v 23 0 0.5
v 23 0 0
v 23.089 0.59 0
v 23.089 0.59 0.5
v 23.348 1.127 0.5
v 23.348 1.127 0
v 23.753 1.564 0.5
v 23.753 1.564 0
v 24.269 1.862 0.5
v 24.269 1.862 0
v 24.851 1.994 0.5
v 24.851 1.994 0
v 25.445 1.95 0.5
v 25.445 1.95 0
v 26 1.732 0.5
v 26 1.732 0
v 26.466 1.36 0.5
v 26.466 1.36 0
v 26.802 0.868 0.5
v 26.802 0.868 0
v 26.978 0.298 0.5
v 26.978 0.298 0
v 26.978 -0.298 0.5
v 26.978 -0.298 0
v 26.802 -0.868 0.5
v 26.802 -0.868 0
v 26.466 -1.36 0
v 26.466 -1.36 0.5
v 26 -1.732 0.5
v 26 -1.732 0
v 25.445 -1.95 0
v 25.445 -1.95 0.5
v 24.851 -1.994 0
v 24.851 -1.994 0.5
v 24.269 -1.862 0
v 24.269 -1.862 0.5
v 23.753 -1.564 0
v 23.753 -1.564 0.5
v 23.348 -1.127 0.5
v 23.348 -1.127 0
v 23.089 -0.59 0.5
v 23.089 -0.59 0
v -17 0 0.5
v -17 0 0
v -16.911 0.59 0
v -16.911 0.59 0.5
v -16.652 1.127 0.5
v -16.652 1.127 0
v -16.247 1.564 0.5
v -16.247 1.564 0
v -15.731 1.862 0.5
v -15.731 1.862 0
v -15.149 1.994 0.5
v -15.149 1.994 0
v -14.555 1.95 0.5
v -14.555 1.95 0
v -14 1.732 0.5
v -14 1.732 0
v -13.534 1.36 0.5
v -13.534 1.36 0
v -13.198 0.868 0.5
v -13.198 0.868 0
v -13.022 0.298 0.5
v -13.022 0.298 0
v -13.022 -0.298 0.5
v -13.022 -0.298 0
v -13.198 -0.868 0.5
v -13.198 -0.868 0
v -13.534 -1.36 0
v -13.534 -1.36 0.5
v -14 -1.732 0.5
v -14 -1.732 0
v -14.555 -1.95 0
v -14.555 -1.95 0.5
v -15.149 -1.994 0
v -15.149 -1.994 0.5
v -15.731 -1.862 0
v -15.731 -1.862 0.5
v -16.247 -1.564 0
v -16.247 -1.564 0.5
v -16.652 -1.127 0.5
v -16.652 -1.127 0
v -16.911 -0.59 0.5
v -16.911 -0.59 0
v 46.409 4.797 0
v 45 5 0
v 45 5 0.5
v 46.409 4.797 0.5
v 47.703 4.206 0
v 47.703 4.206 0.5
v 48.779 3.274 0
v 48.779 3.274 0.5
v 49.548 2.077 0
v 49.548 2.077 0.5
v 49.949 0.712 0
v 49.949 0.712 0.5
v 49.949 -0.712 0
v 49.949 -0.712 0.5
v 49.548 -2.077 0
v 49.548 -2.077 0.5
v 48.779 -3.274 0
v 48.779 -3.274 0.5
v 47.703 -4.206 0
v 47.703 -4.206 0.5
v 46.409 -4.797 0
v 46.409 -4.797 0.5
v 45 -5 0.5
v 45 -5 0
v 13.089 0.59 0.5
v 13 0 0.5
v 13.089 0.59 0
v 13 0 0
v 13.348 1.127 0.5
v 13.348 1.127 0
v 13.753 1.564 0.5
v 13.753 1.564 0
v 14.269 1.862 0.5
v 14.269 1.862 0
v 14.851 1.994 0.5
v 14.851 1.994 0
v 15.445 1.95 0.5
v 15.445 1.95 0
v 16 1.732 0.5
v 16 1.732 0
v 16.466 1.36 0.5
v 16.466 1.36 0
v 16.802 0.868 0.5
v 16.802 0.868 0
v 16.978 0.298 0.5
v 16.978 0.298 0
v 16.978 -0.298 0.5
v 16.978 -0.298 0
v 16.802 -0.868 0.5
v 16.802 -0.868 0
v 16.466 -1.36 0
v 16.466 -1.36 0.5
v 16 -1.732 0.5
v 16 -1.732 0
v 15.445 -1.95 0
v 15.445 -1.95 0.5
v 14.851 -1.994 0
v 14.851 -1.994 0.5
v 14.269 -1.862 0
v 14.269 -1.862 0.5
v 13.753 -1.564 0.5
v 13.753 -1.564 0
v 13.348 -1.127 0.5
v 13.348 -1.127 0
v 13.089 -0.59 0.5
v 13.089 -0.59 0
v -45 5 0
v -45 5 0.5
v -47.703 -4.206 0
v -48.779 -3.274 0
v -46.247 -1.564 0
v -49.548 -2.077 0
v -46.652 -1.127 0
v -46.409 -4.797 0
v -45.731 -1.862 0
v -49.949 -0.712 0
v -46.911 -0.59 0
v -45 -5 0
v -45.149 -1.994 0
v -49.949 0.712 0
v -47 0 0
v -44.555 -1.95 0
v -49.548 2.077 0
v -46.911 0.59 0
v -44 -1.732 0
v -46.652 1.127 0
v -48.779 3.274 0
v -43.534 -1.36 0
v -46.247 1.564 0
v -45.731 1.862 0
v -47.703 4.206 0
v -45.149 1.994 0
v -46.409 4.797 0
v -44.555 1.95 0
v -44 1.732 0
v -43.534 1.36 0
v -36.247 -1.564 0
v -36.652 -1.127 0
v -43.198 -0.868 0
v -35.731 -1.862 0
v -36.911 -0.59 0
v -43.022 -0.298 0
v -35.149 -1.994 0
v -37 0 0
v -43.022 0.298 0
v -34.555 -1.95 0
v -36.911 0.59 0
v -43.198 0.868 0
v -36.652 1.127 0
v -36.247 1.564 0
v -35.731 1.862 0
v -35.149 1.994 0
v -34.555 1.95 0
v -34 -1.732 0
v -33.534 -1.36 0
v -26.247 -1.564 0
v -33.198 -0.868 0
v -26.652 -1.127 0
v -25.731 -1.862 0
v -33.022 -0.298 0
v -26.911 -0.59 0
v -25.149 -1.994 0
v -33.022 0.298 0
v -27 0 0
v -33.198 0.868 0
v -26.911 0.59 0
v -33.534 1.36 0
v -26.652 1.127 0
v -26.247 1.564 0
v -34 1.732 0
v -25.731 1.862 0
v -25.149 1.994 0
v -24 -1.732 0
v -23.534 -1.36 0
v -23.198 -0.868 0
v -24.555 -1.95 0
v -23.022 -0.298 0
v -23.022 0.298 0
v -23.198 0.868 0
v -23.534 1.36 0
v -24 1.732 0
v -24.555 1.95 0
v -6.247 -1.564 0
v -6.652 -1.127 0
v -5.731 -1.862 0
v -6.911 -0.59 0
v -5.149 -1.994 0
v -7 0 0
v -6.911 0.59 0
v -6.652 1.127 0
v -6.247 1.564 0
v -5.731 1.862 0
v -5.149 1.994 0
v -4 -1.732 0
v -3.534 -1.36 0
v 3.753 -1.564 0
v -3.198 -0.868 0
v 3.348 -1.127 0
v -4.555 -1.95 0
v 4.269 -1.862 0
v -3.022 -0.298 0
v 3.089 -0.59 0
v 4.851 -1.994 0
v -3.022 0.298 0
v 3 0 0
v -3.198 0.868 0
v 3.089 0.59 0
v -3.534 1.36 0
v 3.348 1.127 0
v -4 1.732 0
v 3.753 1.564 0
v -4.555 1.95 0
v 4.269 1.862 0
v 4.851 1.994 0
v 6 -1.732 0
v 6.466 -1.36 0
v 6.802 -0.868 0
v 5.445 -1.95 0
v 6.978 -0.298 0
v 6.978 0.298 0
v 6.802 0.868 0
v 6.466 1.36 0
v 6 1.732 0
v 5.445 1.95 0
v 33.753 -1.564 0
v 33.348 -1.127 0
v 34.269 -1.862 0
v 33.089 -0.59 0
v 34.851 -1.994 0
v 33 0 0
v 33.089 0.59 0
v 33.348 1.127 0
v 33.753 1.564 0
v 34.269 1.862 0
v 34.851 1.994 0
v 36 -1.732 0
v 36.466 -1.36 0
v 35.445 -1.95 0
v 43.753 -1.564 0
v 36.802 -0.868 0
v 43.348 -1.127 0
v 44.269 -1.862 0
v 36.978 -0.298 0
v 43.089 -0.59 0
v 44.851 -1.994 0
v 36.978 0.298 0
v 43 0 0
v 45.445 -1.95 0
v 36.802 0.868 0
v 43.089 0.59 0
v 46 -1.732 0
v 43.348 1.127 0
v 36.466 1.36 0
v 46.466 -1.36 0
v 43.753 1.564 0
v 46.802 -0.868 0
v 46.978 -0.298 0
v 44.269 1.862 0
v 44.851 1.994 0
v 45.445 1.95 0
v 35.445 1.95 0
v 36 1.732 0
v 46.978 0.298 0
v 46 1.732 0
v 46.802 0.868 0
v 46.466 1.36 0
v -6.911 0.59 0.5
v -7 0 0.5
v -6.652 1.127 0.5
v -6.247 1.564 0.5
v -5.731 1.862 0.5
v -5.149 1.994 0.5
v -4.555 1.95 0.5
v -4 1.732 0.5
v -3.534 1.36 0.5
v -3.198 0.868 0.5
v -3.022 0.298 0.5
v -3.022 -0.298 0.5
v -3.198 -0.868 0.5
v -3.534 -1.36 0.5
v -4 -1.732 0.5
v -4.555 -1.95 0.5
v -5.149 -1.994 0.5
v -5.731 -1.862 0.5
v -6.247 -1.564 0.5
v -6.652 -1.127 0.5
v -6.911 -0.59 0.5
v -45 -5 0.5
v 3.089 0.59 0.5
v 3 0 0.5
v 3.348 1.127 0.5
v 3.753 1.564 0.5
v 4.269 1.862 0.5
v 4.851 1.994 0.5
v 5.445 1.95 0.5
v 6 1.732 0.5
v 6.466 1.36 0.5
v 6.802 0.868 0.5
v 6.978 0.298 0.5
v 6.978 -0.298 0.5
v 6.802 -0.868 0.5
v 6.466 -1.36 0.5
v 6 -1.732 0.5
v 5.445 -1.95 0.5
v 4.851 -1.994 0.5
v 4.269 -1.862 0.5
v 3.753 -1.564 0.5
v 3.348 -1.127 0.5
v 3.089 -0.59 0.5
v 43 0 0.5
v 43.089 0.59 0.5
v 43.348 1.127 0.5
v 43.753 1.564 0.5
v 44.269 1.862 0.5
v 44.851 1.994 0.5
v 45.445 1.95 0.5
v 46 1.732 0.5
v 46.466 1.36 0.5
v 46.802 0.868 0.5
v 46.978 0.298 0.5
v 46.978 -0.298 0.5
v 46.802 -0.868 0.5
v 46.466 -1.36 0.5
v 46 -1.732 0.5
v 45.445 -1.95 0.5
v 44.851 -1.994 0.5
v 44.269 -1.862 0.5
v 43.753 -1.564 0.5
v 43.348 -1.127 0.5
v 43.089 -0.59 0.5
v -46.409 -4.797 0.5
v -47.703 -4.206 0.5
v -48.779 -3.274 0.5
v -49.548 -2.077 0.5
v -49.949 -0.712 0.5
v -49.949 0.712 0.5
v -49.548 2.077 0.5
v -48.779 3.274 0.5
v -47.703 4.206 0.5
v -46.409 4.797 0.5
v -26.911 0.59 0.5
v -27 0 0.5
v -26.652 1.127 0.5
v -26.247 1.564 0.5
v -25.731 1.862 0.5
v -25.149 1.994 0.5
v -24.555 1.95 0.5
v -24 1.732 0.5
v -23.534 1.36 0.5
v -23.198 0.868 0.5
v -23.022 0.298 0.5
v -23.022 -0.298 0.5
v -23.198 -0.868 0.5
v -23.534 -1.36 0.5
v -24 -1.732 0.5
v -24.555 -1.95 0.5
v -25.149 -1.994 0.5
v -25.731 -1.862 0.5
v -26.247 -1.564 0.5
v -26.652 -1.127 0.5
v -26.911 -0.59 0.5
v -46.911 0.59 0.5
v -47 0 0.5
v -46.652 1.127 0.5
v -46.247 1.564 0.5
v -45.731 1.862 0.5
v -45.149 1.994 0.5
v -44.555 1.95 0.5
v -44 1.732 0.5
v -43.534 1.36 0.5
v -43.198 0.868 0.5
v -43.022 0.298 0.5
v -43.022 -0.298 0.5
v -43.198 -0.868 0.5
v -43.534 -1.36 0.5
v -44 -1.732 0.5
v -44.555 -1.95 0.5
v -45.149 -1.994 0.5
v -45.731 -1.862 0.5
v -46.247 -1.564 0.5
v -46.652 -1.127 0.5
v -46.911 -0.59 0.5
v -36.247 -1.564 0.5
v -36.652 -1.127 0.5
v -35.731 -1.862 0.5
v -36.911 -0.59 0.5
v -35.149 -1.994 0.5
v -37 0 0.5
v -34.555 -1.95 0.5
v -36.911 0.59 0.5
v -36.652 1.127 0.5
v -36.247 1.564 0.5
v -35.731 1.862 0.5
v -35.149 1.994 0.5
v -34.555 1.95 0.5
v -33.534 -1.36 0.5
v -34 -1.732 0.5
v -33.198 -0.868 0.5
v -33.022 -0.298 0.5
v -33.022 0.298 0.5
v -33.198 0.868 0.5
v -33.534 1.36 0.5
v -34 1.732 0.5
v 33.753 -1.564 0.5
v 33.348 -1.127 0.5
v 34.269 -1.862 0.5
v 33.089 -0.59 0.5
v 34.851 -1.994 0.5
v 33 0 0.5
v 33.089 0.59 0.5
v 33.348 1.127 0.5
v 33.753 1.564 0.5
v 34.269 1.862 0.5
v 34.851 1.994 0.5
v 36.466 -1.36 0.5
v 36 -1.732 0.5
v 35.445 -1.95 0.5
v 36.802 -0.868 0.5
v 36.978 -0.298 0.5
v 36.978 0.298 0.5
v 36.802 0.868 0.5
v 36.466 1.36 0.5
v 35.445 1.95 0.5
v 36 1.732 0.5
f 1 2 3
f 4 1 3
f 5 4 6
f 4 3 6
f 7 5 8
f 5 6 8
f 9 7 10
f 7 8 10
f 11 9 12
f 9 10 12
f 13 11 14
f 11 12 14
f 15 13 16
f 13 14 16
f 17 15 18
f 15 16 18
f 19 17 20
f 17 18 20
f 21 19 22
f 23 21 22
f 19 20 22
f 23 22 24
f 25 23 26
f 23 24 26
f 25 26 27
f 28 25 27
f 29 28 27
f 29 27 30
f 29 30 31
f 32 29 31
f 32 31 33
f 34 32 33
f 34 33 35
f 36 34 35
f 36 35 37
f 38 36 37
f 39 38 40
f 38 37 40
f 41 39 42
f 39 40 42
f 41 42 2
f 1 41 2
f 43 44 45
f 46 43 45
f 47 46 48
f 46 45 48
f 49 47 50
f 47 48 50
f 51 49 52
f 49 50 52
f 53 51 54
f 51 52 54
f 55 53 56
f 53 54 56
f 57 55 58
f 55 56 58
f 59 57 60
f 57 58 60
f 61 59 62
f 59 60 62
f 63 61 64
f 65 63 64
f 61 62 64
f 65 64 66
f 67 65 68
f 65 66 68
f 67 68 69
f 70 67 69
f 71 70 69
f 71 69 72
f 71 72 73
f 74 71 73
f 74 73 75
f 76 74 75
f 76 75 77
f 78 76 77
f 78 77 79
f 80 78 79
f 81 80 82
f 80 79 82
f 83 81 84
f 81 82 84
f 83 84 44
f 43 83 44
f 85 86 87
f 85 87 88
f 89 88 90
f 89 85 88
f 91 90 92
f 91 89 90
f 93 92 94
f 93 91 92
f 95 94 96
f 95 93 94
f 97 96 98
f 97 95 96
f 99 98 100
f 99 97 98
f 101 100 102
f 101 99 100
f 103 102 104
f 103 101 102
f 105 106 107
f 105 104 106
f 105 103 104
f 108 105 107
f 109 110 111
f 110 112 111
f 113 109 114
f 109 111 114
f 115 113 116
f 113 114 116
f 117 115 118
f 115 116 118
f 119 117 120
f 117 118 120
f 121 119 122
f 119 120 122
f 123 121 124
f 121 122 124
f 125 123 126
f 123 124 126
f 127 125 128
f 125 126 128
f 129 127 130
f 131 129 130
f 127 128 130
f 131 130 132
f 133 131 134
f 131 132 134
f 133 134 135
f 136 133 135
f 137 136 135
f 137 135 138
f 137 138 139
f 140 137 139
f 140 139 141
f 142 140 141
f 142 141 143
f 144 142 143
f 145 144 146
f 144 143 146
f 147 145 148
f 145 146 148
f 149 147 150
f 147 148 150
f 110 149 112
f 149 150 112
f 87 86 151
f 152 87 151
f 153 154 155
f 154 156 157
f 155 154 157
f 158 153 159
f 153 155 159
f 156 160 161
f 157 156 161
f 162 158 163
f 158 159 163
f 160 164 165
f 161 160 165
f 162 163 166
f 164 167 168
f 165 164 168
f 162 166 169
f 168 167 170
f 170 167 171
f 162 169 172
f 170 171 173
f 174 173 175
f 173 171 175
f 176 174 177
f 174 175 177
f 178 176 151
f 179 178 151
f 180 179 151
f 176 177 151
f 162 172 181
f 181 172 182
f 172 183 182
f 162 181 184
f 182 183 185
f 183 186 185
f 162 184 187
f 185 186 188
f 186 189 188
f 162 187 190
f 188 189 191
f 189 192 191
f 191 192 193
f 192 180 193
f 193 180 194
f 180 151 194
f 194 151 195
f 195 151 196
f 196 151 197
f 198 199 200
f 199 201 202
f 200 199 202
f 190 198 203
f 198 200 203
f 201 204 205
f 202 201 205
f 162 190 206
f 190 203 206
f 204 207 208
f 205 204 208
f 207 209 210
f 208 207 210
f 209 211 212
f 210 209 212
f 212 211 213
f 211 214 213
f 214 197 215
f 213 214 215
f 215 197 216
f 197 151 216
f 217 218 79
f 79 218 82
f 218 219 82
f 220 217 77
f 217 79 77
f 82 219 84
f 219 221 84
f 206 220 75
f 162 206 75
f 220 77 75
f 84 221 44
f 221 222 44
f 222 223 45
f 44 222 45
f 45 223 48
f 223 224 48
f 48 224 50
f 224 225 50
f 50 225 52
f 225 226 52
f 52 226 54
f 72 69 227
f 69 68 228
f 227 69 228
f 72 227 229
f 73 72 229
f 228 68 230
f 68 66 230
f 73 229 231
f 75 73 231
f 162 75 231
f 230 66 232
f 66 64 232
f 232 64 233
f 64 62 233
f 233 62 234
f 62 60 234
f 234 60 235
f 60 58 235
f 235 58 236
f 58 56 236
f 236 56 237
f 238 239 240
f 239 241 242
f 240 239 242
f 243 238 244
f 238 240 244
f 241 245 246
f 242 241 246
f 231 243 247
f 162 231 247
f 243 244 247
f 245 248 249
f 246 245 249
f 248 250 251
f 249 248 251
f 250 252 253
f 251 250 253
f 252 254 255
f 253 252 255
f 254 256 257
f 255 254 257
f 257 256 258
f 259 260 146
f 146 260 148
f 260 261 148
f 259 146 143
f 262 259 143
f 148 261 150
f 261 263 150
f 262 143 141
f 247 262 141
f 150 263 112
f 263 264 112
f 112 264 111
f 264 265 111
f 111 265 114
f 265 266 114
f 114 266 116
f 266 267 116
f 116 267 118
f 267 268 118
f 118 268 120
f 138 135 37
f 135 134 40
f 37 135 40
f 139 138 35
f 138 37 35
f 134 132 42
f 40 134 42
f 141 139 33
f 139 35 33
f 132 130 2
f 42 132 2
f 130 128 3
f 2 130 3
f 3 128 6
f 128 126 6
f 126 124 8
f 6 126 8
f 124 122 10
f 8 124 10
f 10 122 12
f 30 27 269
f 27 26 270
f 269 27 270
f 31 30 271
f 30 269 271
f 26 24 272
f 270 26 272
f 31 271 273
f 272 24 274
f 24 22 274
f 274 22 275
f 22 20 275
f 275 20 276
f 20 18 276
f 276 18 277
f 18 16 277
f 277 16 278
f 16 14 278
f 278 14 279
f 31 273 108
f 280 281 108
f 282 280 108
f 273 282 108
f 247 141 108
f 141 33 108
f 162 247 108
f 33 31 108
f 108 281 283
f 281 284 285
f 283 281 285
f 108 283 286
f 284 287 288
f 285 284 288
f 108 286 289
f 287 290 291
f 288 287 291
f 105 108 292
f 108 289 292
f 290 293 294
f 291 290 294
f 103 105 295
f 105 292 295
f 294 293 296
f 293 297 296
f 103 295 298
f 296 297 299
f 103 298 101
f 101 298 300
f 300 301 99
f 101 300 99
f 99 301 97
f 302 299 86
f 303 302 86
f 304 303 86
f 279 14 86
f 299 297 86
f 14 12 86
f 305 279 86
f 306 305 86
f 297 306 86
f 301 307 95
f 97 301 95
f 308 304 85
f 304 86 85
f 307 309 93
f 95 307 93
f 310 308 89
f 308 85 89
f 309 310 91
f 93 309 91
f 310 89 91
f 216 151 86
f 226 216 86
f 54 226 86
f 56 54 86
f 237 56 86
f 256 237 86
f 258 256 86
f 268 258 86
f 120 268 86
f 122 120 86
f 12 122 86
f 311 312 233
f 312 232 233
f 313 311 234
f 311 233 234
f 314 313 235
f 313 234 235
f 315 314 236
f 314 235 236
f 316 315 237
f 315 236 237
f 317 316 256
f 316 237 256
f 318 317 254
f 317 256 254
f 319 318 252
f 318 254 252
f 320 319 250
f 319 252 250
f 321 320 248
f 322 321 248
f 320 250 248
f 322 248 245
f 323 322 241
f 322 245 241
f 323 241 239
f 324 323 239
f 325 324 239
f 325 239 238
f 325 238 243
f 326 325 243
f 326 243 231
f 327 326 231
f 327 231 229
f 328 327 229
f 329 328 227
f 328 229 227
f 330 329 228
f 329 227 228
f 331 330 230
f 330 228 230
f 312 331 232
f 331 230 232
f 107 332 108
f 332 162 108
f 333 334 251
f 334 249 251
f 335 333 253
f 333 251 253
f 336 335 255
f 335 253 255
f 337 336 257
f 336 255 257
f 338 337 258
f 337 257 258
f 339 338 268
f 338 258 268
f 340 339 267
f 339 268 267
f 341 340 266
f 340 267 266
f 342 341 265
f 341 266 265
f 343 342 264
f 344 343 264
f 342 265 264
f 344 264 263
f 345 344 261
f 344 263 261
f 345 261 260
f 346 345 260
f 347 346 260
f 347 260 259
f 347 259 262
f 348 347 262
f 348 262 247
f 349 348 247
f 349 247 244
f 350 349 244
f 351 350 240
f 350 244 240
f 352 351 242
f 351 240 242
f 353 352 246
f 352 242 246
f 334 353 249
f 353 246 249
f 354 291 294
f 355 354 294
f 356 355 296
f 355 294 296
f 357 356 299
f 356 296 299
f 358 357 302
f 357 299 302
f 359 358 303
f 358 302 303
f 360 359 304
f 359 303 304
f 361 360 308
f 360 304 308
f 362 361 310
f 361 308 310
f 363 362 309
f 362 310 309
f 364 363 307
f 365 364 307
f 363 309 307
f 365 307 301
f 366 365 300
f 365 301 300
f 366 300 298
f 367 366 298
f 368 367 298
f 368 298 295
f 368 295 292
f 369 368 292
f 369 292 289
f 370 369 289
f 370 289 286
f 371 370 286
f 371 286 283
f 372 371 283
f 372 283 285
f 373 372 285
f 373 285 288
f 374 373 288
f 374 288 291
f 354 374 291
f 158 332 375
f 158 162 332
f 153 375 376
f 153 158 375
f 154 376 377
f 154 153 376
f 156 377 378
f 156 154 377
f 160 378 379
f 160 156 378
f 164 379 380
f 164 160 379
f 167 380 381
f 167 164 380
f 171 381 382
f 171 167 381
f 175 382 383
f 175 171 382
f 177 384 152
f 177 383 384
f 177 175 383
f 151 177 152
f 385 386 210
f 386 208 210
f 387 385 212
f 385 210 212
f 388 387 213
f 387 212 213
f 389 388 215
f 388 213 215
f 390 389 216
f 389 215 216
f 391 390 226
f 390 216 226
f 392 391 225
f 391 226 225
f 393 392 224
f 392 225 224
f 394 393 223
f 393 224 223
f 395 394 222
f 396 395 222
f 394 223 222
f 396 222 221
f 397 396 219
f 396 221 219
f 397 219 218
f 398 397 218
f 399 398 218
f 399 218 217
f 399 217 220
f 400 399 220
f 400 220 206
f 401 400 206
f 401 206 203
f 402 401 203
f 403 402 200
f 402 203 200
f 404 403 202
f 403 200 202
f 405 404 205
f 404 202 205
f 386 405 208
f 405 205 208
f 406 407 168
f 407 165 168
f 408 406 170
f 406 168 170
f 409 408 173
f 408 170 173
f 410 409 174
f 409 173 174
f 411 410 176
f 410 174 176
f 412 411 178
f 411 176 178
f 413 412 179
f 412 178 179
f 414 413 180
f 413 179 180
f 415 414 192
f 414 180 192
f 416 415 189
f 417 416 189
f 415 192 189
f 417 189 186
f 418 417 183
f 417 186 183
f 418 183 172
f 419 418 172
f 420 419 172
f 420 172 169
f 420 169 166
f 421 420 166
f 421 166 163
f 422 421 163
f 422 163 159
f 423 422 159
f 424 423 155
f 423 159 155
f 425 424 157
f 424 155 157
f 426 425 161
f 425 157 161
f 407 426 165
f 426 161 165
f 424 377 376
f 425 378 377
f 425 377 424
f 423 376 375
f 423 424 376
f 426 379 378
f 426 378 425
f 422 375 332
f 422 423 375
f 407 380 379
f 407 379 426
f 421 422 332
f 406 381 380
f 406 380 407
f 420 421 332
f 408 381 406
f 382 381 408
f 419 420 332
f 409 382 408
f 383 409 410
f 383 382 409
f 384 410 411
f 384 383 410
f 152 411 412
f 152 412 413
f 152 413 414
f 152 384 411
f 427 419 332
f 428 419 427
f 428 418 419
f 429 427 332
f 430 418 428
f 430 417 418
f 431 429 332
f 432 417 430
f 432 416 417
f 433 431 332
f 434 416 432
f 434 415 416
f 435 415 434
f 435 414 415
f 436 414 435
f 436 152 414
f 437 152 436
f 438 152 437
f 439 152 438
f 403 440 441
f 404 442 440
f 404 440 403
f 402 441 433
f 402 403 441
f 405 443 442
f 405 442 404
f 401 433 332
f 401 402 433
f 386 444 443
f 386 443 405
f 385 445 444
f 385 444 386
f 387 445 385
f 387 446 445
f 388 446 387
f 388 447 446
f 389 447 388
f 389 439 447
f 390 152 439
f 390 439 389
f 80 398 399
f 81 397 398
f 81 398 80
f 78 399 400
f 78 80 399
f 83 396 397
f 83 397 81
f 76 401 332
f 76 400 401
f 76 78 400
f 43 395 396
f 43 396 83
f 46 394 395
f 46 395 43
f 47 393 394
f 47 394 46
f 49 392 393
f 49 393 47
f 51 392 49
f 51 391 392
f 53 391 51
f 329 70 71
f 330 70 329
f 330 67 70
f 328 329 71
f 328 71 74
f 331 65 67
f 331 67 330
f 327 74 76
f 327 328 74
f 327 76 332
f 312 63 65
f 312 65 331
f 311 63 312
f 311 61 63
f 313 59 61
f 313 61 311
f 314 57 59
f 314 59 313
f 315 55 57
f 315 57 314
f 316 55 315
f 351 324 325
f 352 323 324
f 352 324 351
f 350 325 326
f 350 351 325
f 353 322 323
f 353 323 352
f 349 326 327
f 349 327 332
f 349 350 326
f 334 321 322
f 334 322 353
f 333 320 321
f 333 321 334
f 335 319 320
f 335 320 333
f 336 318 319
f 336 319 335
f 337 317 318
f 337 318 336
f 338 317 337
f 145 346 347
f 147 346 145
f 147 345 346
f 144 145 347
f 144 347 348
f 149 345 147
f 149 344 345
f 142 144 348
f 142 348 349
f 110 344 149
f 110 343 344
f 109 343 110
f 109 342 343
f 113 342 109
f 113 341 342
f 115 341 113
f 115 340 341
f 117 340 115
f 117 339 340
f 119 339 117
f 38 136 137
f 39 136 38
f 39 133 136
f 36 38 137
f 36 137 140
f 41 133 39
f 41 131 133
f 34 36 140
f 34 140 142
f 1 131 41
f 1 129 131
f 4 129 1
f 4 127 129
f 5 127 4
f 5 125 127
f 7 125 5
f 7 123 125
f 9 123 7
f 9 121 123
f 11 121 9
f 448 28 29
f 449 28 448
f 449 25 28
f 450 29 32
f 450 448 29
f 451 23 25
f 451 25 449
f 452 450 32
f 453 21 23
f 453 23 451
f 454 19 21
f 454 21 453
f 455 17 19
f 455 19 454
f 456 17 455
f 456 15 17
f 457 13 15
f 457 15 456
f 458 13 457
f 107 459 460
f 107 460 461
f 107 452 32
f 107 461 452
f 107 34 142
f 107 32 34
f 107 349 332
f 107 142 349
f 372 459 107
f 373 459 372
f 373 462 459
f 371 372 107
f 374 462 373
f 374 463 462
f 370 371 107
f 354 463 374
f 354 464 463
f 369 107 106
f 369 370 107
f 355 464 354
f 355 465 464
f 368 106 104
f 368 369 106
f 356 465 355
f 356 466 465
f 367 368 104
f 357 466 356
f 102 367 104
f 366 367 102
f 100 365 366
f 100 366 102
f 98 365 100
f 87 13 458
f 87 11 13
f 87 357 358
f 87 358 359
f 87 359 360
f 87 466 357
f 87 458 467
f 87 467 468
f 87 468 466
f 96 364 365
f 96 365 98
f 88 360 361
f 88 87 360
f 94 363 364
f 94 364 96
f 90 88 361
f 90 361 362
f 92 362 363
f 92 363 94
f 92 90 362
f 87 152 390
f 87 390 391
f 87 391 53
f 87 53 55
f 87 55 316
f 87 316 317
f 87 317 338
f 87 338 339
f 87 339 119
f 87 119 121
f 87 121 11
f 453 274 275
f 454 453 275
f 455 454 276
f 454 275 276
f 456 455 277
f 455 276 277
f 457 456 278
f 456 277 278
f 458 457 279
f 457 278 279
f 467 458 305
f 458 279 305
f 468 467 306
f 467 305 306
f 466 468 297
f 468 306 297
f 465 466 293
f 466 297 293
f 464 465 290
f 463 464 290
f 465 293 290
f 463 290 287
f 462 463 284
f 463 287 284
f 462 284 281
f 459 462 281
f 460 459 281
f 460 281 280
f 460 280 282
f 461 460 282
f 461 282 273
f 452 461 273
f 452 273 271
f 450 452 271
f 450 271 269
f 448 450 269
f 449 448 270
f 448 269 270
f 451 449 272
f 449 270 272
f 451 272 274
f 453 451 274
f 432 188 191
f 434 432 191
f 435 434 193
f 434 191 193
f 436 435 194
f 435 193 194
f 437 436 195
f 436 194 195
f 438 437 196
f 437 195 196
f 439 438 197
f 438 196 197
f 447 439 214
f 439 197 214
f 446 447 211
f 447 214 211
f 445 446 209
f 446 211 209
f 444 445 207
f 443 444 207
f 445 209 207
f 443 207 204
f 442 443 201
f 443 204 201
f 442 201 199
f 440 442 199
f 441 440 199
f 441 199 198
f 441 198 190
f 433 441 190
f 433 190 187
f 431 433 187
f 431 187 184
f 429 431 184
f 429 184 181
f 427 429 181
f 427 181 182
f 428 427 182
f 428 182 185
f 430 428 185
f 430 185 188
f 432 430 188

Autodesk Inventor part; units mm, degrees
ref_plane "YZ Plane" through (0, 0, 0) normal (1, 0, 0) x (0, 1, 0)
ref_plane "XZ Plane" through (0, 0, 0) normal (0, 1, 0) x (-1, 0, 0)
ref_plane "XY Plane" through (0, 0, 0) normal (0, 0, 1) x (1, 0, 0)
sketch "Náčrt1" plane through (0, 0, 0) normal (0, 0, 1) x (1, 0, 0)
  line L0 (-45, 0) -> (45, 0) construction
  line L1 (-45, -5) -> (45, -5)
  line L2 (45, 5) -> (-45, 5)
  arc A0 (-45, 5) -> (-45, -5) centre (-45, 0) ccw
  arc A1 (45, -5) -> (45, 5) centre (45, 0) ccw
  point P0 (0, 0)
  point P1 (50, 0)
  dimension "d0" = 50
  dimension "d1" = 5
extrude "Vysunutí1" add sketch "Náčrt1" along normal blind 0.5
sketch "Náčrt2" plane through (0, 0, 0) normal (0, 0, -1) x (-1, 0, 0)
  arc A0 (45, -5) -> (45, 5) centre (45, 0) ccw projected
  circle A1 centre (45, 0) radius 2
  point P0 (0, 0)
  dimension "d4" = 4
extrude "Vysunutí2" cut sketch "Náčrt2" against normal through all
pattern_linear "Obdélníkové pole1" count 10 spacing 10 along (1, 0, 0) of "Vysunutí2"
properties part number "1010"
